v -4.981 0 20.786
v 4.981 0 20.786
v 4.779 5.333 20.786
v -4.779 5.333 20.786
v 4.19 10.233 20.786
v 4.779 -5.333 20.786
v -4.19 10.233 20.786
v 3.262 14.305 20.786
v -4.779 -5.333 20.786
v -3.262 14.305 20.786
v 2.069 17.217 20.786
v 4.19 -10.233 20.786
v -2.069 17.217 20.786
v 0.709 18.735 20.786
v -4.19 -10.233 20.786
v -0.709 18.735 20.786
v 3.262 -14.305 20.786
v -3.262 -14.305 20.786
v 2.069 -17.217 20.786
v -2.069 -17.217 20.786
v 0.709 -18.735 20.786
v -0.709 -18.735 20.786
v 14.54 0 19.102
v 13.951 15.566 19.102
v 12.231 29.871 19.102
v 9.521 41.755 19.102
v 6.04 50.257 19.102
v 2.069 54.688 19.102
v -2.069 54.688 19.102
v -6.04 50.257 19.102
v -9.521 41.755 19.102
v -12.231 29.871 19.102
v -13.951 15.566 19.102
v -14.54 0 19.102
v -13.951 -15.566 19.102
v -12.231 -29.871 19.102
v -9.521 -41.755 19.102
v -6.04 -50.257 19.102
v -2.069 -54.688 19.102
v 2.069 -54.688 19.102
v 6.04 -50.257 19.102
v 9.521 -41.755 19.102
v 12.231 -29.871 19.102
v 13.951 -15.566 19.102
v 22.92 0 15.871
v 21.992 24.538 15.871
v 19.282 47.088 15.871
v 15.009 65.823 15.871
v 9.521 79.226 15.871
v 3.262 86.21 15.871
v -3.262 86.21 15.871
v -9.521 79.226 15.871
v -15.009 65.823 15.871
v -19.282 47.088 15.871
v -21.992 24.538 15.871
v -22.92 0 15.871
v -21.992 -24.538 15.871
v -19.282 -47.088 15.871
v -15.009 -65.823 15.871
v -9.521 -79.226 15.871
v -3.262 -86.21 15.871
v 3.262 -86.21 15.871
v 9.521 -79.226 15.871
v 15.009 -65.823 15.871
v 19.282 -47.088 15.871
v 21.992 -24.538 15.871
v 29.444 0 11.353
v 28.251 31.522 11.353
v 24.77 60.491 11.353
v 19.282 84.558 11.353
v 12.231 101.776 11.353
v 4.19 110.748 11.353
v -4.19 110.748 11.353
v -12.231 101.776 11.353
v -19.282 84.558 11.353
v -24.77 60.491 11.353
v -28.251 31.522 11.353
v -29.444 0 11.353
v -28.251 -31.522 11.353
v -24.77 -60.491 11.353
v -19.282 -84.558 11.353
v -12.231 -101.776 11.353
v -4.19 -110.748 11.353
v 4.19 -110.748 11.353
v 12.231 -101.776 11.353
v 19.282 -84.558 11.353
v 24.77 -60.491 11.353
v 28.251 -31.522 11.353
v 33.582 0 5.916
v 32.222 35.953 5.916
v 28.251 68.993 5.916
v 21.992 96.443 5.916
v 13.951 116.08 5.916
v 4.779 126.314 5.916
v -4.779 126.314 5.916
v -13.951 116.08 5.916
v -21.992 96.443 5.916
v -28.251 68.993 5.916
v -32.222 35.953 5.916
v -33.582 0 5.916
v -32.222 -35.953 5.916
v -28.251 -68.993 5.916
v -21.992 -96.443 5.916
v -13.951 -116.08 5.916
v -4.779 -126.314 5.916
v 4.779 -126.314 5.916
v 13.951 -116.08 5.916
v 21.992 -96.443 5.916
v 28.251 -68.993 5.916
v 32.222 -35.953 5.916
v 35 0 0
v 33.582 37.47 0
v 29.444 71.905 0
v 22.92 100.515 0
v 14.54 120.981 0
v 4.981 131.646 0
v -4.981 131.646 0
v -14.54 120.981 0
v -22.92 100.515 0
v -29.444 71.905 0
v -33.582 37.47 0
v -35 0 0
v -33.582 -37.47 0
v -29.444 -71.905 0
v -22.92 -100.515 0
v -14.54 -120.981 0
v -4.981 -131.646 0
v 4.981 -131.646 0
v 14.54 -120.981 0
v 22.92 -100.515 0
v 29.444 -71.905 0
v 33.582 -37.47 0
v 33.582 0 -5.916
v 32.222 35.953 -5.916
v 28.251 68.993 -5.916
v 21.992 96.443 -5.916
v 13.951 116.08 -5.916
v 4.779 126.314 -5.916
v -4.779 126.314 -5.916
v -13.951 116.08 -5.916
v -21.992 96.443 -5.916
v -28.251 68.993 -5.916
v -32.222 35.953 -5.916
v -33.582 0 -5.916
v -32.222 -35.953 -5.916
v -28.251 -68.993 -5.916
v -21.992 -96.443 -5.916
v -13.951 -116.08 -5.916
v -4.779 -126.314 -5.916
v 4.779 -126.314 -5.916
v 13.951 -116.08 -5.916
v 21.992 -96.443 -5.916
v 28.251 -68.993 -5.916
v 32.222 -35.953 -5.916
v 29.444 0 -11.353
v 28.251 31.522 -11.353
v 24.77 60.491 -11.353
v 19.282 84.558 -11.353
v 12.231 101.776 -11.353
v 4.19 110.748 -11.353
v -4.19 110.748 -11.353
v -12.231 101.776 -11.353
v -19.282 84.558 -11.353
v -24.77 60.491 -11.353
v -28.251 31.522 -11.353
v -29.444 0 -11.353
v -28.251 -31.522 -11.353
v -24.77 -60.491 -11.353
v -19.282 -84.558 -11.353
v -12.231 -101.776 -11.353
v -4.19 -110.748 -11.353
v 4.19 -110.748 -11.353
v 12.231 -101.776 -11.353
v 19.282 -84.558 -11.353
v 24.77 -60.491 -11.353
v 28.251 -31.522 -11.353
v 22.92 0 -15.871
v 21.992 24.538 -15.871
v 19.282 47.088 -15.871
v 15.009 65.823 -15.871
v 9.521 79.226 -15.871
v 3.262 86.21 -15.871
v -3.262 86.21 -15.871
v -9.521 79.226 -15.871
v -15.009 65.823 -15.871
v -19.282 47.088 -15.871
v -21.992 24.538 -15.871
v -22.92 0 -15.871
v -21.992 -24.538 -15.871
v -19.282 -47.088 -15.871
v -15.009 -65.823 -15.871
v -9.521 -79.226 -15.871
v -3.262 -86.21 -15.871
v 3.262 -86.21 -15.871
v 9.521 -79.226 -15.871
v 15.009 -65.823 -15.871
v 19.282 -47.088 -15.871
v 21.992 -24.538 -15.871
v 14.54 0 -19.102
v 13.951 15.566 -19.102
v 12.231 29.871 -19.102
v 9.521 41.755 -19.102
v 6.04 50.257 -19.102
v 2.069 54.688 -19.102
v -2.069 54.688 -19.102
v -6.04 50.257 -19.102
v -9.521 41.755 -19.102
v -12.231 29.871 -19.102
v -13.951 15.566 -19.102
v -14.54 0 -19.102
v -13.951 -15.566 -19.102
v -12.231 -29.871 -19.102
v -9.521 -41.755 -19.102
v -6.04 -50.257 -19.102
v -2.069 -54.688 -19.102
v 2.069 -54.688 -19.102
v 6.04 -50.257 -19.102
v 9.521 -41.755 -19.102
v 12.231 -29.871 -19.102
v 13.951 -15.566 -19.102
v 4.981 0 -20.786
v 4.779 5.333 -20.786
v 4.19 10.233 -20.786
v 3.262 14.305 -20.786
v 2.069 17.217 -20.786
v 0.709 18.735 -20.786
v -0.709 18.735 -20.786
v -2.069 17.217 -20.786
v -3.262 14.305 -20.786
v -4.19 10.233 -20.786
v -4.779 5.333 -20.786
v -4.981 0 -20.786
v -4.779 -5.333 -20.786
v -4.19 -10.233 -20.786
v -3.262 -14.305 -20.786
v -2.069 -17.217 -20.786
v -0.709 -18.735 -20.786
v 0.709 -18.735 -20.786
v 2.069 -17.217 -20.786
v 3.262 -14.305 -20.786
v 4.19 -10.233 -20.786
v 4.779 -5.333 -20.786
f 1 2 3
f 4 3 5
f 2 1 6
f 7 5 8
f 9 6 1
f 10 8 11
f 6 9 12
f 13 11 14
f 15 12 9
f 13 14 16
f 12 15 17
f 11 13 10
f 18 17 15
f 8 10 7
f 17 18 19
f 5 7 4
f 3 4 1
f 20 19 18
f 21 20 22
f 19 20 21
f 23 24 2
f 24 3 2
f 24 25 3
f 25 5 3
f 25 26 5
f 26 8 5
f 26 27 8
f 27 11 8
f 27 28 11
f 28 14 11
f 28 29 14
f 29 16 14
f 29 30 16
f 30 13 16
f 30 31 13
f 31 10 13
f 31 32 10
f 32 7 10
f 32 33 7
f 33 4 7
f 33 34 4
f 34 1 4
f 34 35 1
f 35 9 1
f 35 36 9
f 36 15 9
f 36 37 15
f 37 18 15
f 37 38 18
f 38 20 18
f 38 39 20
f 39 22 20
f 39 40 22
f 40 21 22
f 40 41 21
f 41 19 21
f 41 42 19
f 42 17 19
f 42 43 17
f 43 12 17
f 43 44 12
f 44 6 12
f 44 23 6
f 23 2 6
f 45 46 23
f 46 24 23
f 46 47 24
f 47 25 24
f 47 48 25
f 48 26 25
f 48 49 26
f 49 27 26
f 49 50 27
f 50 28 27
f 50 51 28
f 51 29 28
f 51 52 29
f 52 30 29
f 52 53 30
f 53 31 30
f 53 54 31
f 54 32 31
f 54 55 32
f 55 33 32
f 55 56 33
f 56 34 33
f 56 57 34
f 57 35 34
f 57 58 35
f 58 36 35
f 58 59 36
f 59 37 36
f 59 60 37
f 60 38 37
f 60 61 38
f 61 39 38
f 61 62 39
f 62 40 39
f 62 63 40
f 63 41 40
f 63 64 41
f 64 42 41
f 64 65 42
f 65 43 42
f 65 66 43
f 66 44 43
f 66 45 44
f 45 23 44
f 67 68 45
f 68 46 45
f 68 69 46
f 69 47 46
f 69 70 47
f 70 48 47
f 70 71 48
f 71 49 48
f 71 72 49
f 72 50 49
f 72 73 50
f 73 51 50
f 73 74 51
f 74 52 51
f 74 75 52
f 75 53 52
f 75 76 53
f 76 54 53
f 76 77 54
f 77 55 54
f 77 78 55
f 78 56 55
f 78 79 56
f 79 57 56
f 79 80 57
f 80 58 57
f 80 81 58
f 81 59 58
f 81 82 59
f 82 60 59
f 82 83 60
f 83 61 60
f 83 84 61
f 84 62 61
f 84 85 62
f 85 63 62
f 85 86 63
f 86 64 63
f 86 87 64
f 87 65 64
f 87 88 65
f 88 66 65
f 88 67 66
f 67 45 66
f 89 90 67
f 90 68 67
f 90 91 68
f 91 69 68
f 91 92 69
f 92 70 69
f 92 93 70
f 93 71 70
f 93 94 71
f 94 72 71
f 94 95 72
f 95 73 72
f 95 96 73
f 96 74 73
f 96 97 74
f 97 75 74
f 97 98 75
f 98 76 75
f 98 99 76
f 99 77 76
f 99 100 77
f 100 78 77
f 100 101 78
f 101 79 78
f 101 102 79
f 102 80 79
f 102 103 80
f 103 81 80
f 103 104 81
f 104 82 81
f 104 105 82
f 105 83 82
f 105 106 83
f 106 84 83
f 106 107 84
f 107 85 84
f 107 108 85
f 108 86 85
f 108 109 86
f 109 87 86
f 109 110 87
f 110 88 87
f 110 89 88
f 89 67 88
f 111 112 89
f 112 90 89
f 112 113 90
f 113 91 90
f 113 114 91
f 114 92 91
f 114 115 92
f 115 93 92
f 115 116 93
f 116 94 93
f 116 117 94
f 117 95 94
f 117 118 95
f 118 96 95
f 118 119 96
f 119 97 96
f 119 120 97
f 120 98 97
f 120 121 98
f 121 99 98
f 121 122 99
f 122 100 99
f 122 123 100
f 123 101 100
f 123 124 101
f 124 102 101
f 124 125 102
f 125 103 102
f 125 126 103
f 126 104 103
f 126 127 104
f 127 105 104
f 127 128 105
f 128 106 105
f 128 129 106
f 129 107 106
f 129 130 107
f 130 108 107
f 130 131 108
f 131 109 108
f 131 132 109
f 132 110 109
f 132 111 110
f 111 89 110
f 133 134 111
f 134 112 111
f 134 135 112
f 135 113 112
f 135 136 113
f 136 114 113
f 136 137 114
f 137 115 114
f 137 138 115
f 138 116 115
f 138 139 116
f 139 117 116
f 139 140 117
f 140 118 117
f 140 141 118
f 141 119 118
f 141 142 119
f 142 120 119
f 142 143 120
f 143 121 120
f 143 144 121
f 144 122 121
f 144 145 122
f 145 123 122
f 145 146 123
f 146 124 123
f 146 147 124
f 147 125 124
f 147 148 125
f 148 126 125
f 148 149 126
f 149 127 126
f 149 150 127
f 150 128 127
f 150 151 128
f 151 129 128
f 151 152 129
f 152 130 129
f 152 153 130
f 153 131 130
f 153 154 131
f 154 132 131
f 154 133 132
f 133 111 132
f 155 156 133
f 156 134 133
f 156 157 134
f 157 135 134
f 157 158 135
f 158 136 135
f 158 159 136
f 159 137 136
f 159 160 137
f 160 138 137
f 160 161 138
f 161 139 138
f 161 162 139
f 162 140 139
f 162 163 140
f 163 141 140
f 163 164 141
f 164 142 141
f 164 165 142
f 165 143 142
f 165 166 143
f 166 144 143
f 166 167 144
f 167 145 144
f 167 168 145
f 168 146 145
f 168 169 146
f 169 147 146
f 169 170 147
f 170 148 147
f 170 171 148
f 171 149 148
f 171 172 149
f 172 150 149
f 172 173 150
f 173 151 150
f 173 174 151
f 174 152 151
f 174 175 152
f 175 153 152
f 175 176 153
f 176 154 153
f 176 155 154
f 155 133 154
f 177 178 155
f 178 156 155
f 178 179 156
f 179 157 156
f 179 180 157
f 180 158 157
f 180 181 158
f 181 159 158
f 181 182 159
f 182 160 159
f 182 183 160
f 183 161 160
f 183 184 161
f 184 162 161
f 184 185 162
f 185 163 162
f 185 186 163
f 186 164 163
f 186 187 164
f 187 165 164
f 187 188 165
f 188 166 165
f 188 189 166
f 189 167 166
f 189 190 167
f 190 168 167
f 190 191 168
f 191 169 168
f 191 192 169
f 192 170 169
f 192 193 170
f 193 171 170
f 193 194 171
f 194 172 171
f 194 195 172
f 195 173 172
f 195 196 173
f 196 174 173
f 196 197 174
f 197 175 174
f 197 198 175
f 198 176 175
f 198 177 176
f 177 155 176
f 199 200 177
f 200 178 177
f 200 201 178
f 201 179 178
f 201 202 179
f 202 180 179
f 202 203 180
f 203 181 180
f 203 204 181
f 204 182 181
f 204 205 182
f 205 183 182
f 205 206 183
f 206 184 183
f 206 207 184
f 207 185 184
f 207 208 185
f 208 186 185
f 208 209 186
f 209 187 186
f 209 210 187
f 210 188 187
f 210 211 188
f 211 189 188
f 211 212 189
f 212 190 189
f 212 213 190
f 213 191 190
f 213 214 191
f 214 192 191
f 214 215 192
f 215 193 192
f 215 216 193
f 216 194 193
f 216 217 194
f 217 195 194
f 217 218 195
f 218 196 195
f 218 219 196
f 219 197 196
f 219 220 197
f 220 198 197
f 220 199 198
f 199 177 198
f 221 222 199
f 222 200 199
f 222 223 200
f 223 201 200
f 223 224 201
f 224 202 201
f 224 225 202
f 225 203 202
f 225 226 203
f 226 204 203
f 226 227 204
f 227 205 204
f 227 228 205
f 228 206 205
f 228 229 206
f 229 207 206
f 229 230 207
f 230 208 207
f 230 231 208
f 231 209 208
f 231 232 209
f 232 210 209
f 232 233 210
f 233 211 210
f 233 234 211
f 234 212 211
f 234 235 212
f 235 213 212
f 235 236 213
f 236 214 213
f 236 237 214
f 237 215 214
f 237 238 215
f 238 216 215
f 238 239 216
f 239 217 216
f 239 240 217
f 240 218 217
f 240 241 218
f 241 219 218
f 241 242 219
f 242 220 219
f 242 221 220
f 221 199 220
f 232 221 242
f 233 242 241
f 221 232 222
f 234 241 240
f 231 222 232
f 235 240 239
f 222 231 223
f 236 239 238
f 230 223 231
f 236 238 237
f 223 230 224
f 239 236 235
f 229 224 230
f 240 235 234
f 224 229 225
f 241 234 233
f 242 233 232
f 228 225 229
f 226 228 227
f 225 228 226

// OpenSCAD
// Generated by SolidPython 1.0.1 on 2020-07-29 00:46:47


scale(v = [5, 19, 3]) {
	sphere(r = 7);
}
/***********************************************
*********      SolidPython code:      **********
************************************************
 
# import packages: SolidPython
from solid import *
from solid.utils import *
from itertools import chain, combinations, permutations


class Resize:

    def __init__(self, scad_file):
        self.scad_file = scad_file
        #self.scad_file = import_scad(scad_file)
        # cone/cylinder param:
        self.r1 = 0
        self.r2 = 0
        self.h = 0
        # rectangular prism param:
        self.w = 0
        self.l = 0
        # ellipse param:
        self.r = 0

    # import OpenScad code (file name corresponds to shape)


    # classify shape + parameters
    def assign(self, param1, param2, param3):
        if self.scad_file == 'cone.scad':
            self.r1 = param1
            self.r2 = param2
            self.h = param3
        elif self.scad_file == 'cylinder.scad':
            self.r1 = param1
            self.r2 = param2
            self.h = param3
        elif self.scad_file == 'rectangularPrism.scad':
            self.h = param1
            self.l = param2
            self.w = param3
        else:
            self.r = param1
            self.h = param2

    # resize parameters
    def iterate(self):
        x = range(3, 20, 2)
        i = 1
        if self.scad_file == 'cone.scad':
            tempList = list(permutations(x, 2))
            for temp in tempList:
                param1 = temp[0]
                param2 = temp[1]
                filepath = 'produced_scad_files/' + 'cone' + str(param1) + '_' + str(param2) + '_' + '.scad'
                scad_render_to_file(cylinder(h=param1, r1=param2, r2=0), filepath)

        elif self.scad_file == 'cylinder.scad':
            tempList = list(permutations(x, 3))
            for temp in tempList:
                param1 = temp[0]
                param2 = temp[1]
                filepath = 'produced_scad_files/' + 'cylinder' + str(param1) + '_' + str(param2) + '_' + '.scad'
                scad_render_to_file(cylinder(h=param1, r1=param2, r2=param2), filepath)

        elif self.scad_file == 'rectangularPrism.scad':
            tempList = list(permutations(x, 3))
            for temp in tempList:
                param1 = temp[0]
                param2 = temp[1]
                param3 = temp[2]
                filepath = 'produced_scad_files/' + 'rectangularPrism' + str(param1) + '_' + str(param2) + '_' + str(
                    param3) + '.scad'
                scad_render_to_file(cube(size=(param1, param2, param3)), filepath)

        elif self.scad_file == 'ellipse.scad':
            tempList = list(permutations(x, 4))
            for temp in tempList:
                param1 = temp[0]
                param2 = temp[1]
                param3 = temp[2]
                param4 = temp[3]
                filepath = 'produced_scad_files/' + 'ellipse' + str(param1) + '_' + str(param2) + '_' + str(param3) + '_' + str(param4) + '.scad'
                scad_render_to_file(scale([param1, param2, param3])(sphere(r=param4)), filepath)

    def render_to_scadfile(self):
        scad_render_to_file(scad, 'example.scad') 
 
************************************************/
